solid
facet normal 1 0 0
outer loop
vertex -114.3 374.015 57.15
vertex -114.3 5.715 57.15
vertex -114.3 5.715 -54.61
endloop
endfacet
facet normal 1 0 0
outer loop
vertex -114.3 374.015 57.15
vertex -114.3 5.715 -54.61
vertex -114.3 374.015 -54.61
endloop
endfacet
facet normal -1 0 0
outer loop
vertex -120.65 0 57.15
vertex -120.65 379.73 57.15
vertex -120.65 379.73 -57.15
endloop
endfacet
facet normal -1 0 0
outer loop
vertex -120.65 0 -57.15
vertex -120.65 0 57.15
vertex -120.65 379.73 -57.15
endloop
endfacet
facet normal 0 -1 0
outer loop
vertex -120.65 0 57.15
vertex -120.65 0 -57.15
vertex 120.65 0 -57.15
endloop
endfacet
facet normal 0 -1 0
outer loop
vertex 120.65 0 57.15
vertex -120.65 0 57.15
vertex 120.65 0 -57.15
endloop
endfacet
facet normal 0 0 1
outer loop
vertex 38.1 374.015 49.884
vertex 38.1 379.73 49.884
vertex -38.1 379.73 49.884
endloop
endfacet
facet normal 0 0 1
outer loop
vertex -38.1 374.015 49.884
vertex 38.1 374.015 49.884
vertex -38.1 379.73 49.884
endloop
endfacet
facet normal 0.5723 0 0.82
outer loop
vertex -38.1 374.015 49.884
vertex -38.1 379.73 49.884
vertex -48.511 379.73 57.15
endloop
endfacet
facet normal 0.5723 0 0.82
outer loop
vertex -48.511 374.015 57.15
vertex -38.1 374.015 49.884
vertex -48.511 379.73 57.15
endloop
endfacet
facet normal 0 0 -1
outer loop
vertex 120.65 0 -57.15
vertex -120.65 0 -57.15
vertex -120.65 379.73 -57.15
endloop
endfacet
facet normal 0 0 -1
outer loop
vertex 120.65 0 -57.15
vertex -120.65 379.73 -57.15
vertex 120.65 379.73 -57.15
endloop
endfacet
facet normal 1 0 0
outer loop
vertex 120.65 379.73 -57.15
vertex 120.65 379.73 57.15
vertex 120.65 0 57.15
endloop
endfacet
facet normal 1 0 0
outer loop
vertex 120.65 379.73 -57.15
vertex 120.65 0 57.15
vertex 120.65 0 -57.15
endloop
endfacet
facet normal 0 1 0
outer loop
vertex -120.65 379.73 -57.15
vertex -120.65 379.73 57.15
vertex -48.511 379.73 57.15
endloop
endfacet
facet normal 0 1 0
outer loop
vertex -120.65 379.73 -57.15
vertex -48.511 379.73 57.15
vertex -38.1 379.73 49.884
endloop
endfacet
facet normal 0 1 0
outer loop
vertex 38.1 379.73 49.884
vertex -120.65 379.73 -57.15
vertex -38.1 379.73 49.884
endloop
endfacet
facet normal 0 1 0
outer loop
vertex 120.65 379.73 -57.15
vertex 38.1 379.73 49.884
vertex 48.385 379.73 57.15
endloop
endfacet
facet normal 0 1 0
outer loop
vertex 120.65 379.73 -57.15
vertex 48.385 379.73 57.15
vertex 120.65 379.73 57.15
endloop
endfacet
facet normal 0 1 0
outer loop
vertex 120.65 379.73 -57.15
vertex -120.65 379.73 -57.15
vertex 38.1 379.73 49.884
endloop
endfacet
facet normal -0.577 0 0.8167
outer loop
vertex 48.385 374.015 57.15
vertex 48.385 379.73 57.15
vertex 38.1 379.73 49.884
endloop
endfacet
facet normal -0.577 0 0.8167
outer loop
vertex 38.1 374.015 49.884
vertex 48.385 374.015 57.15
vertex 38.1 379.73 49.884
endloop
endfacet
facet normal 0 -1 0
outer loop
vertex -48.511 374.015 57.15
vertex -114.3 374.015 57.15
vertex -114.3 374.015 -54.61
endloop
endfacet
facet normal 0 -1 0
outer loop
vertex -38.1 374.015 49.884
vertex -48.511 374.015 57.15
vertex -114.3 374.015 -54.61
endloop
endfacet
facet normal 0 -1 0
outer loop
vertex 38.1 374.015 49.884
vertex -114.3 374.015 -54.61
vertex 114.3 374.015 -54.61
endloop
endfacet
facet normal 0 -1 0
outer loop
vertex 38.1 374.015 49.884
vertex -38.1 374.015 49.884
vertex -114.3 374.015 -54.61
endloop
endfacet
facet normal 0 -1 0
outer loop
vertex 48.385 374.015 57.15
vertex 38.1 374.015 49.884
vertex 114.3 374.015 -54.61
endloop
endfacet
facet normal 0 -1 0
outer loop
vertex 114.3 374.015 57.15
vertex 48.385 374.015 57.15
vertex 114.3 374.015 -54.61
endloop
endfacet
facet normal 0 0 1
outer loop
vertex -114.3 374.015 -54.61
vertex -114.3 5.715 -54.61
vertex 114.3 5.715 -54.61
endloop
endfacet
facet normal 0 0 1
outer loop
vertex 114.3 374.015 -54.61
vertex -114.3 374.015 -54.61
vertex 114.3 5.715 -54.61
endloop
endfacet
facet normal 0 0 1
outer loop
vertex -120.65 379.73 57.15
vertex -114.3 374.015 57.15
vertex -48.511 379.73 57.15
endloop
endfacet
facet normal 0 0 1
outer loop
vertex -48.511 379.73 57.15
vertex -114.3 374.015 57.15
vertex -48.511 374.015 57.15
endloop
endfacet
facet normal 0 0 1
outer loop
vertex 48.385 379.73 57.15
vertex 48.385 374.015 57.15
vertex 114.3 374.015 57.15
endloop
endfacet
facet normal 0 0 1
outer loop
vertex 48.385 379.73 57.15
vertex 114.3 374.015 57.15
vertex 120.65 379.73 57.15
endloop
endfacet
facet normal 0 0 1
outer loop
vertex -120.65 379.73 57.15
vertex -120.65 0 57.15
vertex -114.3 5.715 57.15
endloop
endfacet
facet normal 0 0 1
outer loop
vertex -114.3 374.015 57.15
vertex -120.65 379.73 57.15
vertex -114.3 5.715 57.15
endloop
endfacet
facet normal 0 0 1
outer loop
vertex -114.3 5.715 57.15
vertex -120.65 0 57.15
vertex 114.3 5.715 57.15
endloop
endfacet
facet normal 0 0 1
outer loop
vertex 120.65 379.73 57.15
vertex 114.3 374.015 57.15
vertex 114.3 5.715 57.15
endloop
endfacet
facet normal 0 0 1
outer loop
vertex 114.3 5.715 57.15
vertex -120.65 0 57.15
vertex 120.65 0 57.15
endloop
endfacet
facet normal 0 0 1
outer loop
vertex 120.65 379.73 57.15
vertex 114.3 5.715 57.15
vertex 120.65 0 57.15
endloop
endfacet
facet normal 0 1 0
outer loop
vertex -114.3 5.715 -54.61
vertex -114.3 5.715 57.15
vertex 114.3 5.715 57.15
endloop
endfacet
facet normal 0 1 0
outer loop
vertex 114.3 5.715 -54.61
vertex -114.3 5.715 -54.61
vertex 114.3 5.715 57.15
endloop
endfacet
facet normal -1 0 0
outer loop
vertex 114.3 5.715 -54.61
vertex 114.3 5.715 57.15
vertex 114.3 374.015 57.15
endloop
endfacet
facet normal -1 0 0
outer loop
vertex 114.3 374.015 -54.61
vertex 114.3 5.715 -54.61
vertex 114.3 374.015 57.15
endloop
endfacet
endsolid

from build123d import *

# Parameters (mm, degrees)
SKETCH1_W           = 241.3
SKETCH1_H           = 114.3
BOSS_EXTRUDE1_DEPTH = 379.73
SKETCH2_W           = 228.6
SKETCH2_H           = 368.3
CUT_EXTRUDE1_DEPTH  = 111.76
CUT_EXTRUDE2_DEPTH  = 111.76


with BuildPart() as part:
    # Sketch1 → Boss-Extrude1 (new body)
    with BuildSketch(Plane(origin=(0, 0, 0), x_dir=(1, 0, 0), z_dir=(0, 1, 0))):
        Rectangle(SKETCH1_W, SKETCH1_H)
    extrude(amount=BOSS_EXTRUDE1_DEPTH)

    # Sketch2 → Cut-Extrude1 (cut)
    with BuildSketch(Plane.XY.offset(57.15)):
        with Locations((0, 189.865)):
            Rectangle(SKETCH2_W, SKETCH2_H)
    extrude(amount=-CUT_EXTRUDE1_DEPTH, mode=Mode.SUBTRACT)

    # Sketch3 → Cut-Extrude2 (cut)
    with BuildSketch(Plane(origin=(0, 379.73, 0), x_dir=(1, 0, 0), z_dir=(0, 1, 0))):
        Polygon((-38.1, -49.883610426), (-48.510901929, -57.15), (48.384797494, -57.15), (38.1, -49.883610426), align=None)
    extrude(amount=-CUT_EXTRUDE2_DEPTH, mode=Mode.SUBTRACT)


solid = part.part
